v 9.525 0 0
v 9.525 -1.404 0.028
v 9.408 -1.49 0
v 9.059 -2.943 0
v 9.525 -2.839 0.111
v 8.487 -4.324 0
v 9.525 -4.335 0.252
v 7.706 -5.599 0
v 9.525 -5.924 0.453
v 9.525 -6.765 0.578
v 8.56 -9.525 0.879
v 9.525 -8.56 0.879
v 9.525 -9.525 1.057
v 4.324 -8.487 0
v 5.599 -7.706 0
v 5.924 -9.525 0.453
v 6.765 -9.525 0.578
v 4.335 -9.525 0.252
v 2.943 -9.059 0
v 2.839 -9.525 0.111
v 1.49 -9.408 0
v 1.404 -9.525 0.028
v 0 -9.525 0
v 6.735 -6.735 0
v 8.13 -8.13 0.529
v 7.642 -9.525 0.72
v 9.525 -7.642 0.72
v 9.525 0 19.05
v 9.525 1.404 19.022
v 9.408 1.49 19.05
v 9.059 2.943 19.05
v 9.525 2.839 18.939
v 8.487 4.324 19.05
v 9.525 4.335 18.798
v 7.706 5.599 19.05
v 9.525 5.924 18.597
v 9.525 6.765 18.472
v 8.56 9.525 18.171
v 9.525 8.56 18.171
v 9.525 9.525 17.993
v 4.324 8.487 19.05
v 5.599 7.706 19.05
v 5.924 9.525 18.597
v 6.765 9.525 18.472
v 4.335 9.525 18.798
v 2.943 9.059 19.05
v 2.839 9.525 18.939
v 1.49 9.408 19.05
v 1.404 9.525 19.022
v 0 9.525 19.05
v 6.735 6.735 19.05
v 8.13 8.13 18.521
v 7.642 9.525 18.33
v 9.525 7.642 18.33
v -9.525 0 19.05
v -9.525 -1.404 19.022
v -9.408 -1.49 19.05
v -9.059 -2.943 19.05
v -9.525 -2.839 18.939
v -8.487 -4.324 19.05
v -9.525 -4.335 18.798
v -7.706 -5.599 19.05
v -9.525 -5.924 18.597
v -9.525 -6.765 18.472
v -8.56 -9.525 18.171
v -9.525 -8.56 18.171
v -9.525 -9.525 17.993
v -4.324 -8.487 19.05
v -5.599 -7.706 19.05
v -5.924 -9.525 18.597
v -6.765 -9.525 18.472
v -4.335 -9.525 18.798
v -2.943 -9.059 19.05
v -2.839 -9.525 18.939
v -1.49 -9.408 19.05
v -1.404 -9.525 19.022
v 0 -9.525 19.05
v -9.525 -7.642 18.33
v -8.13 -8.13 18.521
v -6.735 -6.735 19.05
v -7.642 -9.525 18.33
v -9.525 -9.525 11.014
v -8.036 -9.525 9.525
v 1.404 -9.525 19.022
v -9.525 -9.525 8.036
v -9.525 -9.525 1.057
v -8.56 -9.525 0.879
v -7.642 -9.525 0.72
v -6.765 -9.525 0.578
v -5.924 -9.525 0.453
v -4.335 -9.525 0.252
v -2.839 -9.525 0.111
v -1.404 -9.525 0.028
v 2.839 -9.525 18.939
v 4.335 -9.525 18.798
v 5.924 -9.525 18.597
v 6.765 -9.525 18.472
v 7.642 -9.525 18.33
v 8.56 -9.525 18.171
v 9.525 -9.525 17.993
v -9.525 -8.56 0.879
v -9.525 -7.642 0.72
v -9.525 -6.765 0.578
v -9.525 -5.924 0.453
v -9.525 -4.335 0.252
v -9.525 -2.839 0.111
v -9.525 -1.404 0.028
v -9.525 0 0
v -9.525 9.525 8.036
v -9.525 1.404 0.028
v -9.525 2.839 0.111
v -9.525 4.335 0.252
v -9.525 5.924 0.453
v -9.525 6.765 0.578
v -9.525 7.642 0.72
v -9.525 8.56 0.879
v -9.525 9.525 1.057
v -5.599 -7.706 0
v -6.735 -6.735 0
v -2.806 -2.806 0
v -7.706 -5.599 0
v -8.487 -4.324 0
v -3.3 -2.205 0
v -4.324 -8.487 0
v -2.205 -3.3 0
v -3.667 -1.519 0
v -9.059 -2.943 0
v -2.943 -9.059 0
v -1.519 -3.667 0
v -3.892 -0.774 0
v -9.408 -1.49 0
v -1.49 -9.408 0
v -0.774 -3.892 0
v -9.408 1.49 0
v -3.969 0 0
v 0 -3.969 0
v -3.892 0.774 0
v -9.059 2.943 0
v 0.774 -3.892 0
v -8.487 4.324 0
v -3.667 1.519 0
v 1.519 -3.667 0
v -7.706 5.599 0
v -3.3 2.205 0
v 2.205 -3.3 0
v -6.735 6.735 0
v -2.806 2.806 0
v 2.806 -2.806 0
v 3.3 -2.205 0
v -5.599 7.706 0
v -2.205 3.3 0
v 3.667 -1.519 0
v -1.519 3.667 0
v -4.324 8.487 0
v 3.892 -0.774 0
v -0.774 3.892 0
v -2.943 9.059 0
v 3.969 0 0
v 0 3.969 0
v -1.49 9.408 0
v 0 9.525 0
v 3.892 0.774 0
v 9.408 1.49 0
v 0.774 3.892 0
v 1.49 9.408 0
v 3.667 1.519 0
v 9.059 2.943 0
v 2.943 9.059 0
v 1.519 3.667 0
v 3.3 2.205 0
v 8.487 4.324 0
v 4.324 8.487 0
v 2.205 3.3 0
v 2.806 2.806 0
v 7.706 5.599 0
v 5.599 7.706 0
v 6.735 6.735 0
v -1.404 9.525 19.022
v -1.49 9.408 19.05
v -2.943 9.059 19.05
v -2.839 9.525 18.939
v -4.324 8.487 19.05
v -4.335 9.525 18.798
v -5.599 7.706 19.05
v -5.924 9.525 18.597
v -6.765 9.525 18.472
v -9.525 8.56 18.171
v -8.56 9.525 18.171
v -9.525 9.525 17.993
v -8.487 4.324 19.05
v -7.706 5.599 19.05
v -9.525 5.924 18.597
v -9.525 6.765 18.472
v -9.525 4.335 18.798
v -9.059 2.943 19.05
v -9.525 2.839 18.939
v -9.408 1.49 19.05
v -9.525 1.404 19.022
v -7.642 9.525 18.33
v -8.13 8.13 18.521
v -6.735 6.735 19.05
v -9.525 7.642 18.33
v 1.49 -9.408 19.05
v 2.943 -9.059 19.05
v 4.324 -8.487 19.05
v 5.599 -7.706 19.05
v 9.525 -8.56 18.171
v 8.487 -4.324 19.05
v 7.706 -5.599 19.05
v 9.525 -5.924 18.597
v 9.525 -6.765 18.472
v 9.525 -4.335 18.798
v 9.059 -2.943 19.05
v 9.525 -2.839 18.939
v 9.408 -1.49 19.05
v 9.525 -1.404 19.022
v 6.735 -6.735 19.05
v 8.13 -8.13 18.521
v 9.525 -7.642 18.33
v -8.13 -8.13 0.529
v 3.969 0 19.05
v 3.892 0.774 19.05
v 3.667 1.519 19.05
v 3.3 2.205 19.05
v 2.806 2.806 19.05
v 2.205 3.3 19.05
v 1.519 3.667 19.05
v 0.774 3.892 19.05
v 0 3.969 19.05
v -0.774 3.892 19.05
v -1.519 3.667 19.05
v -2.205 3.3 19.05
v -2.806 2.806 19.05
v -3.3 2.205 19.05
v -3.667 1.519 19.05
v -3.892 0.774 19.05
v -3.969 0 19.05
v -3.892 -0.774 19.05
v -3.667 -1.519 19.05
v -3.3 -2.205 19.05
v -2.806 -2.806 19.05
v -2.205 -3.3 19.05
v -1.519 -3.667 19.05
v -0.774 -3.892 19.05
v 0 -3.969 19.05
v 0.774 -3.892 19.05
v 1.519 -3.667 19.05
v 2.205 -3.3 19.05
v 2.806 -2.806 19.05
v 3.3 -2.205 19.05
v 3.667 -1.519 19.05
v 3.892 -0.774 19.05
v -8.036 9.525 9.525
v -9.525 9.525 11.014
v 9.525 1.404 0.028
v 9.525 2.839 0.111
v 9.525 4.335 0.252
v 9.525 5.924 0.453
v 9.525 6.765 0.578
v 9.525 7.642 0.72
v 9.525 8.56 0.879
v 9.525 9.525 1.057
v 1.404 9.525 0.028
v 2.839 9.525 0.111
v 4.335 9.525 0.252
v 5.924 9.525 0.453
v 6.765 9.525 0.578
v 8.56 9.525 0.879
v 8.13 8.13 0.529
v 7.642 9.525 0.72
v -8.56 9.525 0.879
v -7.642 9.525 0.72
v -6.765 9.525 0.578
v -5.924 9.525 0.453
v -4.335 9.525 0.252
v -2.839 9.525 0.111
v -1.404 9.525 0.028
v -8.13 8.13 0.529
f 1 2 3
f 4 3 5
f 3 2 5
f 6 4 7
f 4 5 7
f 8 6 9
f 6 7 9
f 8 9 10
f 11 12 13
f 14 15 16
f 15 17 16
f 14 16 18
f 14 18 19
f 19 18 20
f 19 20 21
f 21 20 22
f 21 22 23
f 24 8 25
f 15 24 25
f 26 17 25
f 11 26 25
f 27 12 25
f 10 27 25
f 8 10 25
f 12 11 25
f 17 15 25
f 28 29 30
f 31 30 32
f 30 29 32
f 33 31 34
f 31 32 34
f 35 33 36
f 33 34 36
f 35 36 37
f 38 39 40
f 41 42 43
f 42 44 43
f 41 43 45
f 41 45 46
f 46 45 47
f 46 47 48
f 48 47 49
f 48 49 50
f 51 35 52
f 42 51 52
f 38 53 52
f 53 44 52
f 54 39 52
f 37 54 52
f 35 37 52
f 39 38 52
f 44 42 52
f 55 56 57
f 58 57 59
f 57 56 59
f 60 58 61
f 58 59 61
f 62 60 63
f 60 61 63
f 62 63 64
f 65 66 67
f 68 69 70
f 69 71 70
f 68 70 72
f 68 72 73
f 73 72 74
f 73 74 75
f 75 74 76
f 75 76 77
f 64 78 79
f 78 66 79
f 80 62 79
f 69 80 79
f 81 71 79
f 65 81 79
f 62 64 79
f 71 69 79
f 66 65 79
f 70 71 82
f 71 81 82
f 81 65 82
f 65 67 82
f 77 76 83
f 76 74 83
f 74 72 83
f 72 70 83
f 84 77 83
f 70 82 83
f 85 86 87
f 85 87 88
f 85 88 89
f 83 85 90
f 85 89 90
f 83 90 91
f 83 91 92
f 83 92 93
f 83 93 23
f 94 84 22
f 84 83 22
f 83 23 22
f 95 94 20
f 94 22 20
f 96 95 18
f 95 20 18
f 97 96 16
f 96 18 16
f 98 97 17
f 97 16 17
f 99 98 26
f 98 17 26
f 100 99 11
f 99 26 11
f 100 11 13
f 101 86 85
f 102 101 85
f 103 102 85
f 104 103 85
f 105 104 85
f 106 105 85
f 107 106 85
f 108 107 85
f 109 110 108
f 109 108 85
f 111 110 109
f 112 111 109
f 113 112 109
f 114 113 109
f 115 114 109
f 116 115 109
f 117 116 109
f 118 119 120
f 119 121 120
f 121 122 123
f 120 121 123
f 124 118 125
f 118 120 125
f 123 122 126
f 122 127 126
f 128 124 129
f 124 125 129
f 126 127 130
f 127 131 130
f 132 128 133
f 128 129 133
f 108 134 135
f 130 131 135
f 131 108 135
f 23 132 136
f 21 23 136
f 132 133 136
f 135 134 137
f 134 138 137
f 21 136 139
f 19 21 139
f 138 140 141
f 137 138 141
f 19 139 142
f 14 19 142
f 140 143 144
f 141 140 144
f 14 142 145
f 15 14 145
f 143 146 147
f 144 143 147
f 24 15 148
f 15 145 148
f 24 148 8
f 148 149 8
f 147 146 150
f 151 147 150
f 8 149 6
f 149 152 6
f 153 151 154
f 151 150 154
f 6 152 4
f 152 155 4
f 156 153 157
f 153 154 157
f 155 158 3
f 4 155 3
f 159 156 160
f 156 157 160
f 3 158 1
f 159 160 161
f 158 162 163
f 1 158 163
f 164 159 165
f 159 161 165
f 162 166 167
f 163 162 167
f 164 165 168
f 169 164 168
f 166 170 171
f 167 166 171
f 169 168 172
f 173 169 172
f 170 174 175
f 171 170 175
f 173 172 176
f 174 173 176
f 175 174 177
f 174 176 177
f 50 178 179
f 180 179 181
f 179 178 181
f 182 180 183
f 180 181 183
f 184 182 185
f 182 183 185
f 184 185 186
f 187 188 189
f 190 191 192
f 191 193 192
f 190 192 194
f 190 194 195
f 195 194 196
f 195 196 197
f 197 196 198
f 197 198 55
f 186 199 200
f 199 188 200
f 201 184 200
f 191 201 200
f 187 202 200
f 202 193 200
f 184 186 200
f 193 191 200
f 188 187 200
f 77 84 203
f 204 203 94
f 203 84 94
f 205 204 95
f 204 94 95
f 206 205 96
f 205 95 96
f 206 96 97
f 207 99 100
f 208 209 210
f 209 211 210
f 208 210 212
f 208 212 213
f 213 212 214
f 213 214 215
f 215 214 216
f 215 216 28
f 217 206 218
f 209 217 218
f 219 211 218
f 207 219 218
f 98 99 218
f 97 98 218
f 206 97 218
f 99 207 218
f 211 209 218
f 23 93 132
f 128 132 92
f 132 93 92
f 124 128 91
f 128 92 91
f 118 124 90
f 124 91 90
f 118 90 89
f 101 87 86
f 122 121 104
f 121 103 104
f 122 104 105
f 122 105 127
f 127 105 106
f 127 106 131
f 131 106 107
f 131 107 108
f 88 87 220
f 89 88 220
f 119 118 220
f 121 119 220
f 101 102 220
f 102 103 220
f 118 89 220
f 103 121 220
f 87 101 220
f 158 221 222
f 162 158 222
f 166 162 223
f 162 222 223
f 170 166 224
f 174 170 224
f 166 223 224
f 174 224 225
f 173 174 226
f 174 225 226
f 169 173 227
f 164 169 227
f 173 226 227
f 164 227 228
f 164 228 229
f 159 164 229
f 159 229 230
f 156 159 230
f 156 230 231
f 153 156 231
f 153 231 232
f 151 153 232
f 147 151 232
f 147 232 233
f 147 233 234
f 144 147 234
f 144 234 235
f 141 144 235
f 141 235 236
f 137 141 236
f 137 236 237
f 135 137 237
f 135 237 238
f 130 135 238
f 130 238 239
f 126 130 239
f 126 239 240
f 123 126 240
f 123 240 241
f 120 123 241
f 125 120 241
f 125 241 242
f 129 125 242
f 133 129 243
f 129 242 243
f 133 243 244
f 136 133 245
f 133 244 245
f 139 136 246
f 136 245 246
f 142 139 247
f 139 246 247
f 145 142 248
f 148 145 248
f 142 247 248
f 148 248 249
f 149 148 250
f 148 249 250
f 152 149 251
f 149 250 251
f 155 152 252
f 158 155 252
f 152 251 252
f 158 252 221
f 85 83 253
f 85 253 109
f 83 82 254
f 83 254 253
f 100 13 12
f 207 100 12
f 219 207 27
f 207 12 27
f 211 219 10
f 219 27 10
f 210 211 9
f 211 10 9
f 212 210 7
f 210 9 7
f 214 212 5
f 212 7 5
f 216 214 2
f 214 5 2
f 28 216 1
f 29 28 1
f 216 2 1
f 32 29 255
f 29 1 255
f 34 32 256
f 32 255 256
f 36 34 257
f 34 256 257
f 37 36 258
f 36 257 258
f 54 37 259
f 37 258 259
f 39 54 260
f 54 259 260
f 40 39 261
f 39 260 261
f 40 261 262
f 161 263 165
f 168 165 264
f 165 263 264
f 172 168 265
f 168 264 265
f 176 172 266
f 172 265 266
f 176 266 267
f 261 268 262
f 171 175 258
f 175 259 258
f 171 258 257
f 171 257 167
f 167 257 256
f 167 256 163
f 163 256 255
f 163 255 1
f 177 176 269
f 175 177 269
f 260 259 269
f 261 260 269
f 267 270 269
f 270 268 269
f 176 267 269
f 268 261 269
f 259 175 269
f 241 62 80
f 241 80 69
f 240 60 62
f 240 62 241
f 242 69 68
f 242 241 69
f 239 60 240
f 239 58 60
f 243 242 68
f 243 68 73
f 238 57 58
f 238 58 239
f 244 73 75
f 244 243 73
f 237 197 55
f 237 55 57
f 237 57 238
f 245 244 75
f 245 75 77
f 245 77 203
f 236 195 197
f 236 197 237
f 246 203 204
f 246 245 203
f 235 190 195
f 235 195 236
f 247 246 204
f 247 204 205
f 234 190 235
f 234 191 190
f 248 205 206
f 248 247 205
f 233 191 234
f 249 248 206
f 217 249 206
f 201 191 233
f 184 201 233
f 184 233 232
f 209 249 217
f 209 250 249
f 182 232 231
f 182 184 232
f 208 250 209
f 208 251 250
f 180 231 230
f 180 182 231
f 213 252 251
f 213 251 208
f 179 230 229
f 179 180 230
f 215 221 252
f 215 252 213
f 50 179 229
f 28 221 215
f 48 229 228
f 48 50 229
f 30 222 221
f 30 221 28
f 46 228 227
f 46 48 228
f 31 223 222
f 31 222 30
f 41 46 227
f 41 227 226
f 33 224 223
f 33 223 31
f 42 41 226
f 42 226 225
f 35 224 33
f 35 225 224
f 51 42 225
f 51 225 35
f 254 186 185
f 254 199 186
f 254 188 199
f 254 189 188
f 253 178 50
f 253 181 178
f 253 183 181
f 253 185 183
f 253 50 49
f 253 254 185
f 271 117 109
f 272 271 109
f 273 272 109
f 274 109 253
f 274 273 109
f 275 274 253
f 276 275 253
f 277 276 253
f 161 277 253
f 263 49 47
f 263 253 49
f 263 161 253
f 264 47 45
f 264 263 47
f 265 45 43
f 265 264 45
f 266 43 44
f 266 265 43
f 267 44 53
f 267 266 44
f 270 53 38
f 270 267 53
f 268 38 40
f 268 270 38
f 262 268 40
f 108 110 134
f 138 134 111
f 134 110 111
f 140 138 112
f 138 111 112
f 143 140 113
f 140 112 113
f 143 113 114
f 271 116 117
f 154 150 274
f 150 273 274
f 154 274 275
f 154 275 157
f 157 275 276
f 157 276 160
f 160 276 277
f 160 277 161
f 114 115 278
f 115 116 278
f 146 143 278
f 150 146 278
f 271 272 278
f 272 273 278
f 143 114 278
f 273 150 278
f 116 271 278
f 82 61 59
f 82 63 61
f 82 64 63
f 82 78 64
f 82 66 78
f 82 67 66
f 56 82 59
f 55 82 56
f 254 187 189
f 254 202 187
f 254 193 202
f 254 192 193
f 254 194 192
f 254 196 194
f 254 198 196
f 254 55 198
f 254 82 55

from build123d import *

# Parameters (mm, degrees)
F0_W      = 19.05
F0_H      = 19.05
F1_DEPTH  = 19.05
F2_R      = 3.96875
F3_DEPTH  = 19.051
F10_DEPTH = 12.7
F12_DEPTH = 25.4


with BuildPart() as f1:
    # F0 (on Top) → F1 (new body)
    with BuildSketch(Plane.XY):
        Rectangle(F0_W, F0_H)
    extrude(amount=F1_DEPTH)

    # F2 (on face) → F3 (cut, through all)
    with BuildSketch(Plane.XY.offset(19.05)):
        Circle(F2_R)
    extrude(amount=-F3_DEPTH, mode=Mode.SUBTRACT)

    # F4 (on Right) → F5 (revolve, cut)
    with BuildSketch(Plane.YZ):
        Polygon((24.765, 19.05), (9.525, 19.05), (24.765, 14.9664543073), align=None)
    revolve(axis=Axis((0, 0, 19.05), (0, 0, 1)), mode=Mode.SUBTRACT)

    # F7 (on Right) → F8 (revolve, cut)
    with BuildSketch(Plane.YZ):
        Polygon((-22.8305501432, 0), (-9.525, 0), (-22.8305501432, 3.5652114157), align=None)
    revolve(axis=Axis((0, 0, 0), (0, 0, -1)), mode=Mode.SUBTRACT)

    # F9 (on Front) → F10 (cut, symmetric)
    with BuildSketch(Plane.XZ):
        Polygon((-9.525, 8.7912914261), (-9.525, 9.525), (-10.3787914261, 7.9375), align=None)
    extrude(amount=F10_DEPTH, both=True, mode=Mode.SUBTRACT)

    # F11 (on face) → F12 (cut)
    with BuildSketch(Plane(origin=(0, 9.525, 0), x_dir=(-1, 0, 0), z_dir=(0, 1, 0))):
        Polygon((9.525, 8.0361114815), (9.525, 9.525), (8.0361114815, 9.525), align=None)
        Polygon((8.0361114815, 9.525), (9.525, 9.525), (9.525, 11.0138885185), align=None)
    extrude(amount=-F12_DEPTH, mode=Mode.SUBTRACT)


solid = f1.part
